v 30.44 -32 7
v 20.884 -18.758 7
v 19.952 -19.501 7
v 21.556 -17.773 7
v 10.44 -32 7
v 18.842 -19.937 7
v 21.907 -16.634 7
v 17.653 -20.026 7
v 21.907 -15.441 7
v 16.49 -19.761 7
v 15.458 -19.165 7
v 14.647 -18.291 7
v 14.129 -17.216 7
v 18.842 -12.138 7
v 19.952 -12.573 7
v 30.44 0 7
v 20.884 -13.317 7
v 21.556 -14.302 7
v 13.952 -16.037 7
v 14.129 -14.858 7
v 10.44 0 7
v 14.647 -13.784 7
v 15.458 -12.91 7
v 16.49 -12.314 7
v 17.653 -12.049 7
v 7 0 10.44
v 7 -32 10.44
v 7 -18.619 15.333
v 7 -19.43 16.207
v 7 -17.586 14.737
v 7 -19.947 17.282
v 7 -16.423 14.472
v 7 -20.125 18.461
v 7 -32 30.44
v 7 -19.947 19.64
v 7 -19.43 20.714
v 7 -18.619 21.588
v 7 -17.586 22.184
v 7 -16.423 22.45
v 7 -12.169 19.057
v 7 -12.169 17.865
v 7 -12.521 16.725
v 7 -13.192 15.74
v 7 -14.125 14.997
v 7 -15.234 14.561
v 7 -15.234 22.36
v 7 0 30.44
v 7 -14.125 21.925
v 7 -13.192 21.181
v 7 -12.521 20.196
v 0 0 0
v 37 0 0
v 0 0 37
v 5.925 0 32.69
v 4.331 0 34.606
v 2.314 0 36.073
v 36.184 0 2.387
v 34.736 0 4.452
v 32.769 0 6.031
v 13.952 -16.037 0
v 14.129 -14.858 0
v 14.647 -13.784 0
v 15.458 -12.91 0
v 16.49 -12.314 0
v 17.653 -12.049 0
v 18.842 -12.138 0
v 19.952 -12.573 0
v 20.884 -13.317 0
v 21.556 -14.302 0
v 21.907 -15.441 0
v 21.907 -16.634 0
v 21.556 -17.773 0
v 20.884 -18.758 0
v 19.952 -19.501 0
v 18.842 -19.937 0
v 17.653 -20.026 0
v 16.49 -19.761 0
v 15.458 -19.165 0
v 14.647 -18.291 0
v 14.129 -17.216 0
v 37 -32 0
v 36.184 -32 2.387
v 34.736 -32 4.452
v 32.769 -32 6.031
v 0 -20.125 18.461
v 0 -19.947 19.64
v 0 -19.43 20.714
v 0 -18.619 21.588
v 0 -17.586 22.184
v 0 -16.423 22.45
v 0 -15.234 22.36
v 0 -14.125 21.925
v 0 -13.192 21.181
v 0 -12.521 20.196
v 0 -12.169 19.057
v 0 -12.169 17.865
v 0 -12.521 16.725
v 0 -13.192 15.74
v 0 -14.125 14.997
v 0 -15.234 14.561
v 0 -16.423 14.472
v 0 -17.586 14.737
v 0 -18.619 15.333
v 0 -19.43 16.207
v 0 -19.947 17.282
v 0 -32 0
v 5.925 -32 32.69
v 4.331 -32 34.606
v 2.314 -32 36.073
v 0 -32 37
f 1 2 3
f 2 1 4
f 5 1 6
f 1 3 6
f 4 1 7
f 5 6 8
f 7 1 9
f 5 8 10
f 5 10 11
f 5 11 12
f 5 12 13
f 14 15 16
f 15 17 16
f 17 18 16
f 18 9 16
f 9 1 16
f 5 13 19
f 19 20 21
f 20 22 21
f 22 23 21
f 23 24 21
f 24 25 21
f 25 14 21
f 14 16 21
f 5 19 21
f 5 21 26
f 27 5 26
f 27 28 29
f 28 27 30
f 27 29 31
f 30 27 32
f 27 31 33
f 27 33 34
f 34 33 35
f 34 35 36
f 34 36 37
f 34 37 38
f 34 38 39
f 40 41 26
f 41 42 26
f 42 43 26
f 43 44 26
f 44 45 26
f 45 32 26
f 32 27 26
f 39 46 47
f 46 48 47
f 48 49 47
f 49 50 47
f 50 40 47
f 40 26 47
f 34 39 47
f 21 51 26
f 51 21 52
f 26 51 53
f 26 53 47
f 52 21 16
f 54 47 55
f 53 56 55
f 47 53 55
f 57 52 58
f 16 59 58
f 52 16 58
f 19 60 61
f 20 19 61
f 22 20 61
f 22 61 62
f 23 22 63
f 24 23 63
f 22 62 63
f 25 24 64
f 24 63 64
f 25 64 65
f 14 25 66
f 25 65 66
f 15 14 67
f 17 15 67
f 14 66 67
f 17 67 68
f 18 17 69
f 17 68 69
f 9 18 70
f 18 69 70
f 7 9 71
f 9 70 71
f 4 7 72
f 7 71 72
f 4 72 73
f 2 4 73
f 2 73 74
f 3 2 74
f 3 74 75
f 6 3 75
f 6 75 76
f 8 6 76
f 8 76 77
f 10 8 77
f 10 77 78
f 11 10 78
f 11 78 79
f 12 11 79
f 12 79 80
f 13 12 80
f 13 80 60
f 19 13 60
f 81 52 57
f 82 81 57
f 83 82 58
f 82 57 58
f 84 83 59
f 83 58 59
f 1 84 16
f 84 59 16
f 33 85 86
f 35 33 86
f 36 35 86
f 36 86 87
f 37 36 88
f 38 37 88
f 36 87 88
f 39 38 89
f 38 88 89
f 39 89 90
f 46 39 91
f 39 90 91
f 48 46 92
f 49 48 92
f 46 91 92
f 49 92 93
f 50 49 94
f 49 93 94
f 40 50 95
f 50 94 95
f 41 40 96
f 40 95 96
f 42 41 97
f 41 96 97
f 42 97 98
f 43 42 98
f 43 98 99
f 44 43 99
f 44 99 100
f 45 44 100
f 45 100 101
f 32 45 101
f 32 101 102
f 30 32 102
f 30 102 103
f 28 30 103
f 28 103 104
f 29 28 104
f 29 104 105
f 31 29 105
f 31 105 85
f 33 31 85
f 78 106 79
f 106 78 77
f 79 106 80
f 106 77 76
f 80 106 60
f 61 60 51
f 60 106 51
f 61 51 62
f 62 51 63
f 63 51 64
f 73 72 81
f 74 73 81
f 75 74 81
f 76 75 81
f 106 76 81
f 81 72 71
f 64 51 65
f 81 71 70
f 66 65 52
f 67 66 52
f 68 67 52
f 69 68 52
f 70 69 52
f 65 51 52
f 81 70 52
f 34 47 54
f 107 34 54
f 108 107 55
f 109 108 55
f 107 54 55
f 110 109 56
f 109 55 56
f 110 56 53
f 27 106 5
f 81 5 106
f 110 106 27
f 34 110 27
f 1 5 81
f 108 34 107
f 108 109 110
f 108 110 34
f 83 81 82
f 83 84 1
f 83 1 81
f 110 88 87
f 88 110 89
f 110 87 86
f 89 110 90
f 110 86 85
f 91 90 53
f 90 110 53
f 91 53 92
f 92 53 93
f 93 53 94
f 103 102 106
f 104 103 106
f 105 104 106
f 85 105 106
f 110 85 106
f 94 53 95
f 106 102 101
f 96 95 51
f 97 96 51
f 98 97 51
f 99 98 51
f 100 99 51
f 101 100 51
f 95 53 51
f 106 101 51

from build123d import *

# Parameters (mm, degrees)
F1_DEPTH = 32
F4_D     = 8
F5_D     = 8


with BuildPart() as f1:
    # F0 (on Front) → F1 (new body)
    with BuildSketch(Plane.XZ):
        with BuildLine():
            Line((0, 37), (0, 0))
            Line((0, 0), (37, 0))
            ThreePointArc((37, 0), (34.735887, 4.452031), (30.44, 7))
            Line((30.44, 7), (10.44, 7))
            Line((10.44, 7), (7, 10.44))
            Line((7, 10.44), (7, 30.44))
            ThreePointArc((7, 30.44), (4.330611, 34.606323), (0, 37))
        make_face()
    extrude(amount=F1_DEPTH)

    # F4 (through all)
    with Locations(Plane.YZ.offset(7)):
        with Locations((-16.124548, 18.460734)):
            Hole(F4_D / 2)

    # F5 (through all)
    with Locations(Plane.XY.offset(7)):
        with Locations((17.951785, -16.037369)):
            Hole(F5_D / 2)


solid = f1.part
